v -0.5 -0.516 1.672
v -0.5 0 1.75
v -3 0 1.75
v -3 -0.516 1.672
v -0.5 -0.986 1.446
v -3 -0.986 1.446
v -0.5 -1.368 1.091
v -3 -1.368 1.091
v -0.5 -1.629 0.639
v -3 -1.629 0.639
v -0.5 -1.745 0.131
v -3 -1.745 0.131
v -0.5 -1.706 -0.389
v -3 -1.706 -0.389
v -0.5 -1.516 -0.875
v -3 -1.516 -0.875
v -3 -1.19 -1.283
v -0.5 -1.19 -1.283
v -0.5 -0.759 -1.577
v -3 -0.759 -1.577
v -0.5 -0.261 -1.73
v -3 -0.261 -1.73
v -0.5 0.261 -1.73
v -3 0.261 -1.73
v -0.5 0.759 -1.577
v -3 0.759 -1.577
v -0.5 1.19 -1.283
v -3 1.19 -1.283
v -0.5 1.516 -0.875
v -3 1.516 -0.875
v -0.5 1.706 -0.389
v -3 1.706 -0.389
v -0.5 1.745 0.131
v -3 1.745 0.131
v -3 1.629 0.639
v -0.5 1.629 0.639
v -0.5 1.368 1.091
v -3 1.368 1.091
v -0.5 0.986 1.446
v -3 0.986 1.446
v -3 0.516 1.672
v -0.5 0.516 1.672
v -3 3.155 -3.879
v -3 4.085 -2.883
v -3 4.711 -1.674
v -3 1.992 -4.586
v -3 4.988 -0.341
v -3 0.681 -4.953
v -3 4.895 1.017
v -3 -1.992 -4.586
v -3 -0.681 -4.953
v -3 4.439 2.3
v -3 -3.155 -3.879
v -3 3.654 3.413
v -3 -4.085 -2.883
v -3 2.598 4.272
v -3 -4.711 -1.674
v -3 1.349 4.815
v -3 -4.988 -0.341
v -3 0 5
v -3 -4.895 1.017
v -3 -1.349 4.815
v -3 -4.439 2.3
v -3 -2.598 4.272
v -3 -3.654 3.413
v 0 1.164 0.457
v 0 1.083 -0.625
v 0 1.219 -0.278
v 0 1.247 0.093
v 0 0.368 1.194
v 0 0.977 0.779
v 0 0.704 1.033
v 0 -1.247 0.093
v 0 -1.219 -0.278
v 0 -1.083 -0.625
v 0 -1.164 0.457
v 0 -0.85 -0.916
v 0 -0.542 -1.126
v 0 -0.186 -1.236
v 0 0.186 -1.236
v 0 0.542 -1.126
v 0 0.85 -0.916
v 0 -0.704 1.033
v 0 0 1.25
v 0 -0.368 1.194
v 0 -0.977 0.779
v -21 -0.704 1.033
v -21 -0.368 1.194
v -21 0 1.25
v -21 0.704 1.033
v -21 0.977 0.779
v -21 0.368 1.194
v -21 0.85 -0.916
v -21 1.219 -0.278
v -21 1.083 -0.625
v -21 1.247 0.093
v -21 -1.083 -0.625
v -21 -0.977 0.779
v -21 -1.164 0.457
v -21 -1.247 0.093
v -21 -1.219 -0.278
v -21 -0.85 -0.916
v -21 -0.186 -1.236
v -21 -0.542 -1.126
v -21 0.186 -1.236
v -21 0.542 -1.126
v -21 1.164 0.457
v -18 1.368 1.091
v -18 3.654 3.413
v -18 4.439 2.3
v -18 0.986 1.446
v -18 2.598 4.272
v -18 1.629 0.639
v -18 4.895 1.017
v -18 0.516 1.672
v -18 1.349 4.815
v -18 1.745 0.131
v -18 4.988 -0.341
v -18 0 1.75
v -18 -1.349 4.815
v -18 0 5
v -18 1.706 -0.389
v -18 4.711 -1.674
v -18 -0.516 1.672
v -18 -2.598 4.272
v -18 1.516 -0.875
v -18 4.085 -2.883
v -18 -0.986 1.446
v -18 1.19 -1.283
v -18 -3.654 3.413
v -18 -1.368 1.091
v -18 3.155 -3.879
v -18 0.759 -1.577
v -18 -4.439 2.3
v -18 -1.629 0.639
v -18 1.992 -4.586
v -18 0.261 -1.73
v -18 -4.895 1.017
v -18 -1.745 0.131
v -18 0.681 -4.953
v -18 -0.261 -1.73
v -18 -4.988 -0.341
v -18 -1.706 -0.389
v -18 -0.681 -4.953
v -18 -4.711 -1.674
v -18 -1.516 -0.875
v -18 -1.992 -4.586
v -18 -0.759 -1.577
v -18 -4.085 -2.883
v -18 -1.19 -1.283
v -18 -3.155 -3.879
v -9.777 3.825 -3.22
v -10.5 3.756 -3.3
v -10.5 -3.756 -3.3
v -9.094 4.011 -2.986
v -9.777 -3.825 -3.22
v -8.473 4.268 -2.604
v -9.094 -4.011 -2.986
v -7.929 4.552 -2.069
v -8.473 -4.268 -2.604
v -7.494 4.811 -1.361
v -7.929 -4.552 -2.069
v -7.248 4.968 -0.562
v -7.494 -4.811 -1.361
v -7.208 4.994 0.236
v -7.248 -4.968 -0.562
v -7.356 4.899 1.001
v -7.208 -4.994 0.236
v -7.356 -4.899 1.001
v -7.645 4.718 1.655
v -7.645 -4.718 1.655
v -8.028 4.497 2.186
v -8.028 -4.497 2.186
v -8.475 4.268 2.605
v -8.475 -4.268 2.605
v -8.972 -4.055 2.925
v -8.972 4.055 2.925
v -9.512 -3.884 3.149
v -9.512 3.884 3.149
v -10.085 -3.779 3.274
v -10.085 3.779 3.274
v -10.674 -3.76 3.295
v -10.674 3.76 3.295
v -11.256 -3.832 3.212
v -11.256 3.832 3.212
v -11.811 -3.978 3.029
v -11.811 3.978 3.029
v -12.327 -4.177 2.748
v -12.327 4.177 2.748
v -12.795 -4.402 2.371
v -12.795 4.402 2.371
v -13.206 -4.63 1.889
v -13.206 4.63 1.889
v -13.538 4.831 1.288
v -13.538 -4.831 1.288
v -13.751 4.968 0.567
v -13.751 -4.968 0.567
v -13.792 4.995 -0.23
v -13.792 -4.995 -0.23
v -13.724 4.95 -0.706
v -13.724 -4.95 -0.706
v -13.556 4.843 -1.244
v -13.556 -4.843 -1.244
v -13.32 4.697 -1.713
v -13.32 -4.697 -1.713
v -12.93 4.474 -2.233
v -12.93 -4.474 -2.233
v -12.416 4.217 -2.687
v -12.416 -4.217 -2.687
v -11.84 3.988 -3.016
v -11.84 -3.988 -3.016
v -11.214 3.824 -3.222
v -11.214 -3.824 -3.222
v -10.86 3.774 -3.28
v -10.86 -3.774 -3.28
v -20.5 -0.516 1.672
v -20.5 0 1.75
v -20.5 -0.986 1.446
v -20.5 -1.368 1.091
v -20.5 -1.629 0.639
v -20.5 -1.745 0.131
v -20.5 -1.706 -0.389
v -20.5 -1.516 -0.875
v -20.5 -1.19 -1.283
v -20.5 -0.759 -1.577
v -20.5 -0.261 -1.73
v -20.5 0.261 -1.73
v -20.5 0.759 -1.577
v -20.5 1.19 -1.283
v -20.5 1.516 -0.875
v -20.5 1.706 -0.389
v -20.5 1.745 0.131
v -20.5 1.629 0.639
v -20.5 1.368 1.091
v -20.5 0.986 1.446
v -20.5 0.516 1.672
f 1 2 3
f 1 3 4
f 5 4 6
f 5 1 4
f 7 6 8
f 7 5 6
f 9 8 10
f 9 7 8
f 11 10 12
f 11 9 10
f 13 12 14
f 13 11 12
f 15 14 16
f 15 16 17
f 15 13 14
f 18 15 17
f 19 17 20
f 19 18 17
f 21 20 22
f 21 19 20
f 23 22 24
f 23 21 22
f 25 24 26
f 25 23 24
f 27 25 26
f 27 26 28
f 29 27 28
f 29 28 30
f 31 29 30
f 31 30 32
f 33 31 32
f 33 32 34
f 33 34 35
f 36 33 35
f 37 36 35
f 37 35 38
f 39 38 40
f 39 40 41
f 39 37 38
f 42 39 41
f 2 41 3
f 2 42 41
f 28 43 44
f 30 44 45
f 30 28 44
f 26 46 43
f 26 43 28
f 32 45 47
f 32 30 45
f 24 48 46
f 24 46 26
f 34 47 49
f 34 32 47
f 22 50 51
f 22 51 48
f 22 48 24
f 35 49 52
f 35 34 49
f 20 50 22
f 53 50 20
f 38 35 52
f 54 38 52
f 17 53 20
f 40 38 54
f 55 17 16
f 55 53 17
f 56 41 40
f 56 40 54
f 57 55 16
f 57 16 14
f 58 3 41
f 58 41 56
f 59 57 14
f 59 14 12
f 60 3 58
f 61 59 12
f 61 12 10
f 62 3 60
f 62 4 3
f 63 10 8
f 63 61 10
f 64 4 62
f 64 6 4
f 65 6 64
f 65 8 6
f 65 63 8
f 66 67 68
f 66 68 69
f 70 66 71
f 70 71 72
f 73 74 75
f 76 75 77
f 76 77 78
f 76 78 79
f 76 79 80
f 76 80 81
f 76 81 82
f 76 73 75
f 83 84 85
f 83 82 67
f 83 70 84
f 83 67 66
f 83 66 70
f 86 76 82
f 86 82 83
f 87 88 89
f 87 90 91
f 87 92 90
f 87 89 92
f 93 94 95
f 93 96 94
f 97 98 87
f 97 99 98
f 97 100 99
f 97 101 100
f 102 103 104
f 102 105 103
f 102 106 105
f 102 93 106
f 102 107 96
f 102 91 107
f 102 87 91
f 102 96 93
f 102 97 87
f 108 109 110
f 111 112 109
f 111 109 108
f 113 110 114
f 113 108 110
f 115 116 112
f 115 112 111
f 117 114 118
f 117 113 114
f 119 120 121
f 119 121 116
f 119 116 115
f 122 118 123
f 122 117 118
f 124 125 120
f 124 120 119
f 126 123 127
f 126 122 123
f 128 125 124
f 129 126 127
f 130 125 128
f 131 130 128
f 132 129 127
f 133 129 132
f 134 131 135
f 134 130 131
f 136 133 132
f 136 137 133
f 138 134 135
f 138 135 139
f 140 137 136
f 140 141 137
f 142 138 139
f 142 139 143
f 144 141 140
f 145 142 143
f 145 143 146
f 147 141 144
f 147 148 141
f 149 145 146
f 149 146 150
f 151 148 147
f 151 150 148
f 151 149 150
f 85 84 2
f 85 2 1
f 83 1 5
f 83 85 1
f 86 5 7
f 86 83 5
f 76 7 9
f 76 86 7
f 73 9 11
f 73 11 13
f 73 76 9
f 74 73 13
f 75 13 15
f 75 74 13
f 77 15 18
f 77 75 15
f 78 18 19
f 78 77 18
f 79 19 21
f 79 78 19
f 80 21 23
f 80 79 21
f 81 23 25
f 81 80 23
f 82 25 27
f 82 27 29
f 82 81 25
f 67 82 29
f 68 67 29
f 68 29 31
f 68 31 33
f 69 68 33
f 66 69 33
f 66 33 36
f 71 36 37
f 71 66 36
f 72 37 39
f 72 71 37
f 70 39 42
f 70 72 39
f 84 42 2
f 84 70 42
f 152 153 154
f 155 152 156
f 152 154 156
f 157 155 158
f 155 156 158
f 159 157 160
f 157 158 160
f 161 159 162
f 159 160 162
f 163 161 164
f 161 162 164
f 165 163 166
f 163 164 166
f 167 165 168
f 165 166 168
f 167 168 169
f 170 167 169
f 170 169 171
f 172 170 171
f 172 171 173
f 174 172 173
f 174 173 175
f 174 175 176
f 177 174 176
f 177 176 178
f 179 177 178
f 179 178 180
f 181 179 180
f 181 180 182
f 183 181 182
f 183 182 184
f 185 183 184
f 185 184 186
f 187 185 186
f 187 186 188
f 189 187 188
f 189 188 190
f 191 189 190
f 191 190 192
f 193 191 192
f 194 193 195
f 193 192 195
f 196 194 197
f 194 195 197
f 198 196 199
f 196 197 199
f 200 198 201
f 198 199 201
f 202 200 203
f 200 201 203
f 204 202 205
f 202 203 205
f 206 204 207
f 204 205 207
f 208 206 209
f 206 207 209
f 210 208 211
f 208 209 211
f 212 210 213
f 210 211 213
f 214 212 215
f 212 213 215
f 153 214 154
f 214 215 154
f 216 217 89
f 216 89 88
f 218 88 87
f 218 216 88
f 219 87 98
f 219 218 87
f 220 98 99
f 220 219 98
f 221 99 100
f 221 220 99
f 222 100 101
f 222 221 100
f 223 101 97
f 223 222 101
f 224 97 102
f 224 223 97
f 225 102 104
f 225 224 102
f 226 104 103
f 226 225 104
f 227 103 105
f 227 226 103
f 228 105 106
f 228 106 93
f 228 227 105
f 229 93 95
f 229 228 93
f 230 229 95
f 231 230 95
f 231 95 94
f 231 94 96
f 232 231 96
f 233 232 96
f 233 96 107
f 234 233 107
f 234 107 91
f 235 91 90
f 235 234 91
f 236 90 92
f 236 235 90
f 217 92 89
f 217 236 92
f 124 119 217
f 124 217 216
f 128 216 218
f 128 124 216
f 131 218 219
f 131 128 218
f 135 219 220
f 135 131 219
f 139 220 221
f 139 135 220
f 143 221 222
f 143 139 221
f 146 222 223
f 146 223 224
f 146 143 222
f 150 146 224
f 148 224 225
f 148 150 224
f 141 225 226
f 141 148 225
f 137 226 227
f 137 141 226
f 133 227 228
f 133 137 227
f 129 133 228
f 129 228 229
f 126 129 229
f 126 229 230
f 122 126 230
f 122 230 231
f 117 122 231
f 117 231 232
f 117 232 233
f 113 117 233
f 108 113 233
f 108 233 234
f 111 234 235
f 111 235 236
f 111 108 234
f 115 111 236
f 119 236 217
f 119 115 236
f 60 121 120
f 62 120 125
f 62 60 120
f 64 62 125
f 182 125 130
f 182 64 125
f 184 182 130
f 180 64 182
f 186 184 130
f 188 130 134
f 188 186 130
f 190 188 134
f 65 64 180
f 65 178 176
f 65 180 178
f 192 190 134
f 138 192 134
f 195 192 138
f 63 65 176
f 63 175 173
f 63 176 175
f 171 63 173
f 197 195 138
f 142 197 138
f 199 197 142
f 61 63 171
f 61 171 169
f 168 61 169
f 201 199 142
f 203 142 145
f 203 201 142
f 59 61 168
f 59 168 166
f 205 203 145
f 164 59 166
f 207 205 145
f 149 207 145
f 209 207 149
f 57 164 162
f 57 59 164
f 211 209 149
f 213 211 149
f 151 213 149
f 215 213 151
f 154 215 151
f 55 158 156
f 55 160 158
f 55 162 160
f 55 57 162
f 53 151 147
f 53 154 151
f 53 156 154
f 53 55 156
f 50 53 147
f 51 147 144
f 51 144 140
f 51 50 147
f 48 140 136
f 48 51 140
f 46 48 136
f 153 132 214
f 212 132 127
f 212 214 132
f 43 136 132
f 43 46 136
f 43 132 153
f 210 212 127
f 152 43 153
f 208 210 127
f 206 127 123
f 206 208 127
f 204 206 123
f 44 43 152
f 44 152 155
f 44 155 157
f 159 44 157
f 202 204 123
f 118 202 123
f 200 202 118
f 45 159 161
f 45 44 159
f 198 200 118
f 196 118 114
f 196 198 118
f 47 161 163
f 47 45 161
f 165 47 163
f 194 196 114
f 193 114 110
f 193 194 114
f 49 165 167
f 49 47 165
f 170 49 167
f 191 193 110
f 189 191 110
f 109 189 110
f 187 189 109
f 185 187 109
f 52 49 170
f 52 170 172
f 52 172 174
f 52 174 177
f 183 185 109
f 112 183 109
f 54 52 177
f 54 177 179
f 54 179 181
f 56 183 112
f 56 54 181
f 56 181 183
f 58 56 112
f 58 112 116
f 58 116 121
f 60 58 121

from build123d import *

# Parameters (mm, degrees)
SMUSSO1_SIZE         = 0.5
FORO_PER_VITE_M6_2_D = 6.6


with BuildPart() as part:
    # Schizzo1 → Rivoluzione1 (revolve)
    with BuildSketch(Plane.XY, mode=Mode.PRIVATE) as rivoluzione1_sk:
        Polygon((-21, 0), (-21, 1.75), (-18, 1.75), (-18, 5), (-3, 5), (-3, 1.75), (0, 1.75), (0, 0), align=None)
    revolve(rivoluzione1_sk.sketch.rotate(Axis((-35.932586733, 0, 0), (1, 0, 0)), 90), axis=Axis((-35.932586733, 0, 0), (1, 0, 0)))

    # Smusso1
    smusso1_edges = [part.edges().sort_by_distance(p)[0] for p in [
        (0, 0, -1.75),
        (-21, 0, -1.75),
    ]]
    chamfer(smusso1_edges, length=SMUSSO1_SIZE)

    # Foro per Vite M6-2 (through all)
    with Locations(Plane(origin=(-10.5, 5, 0), x_dir=(0, 0, 1), z_dir=(0, 1, 0))):
        with Locations((0, 0)):
            Hole(FORO_PER_VITE_M6_2_D / 2)


solid = part.part
